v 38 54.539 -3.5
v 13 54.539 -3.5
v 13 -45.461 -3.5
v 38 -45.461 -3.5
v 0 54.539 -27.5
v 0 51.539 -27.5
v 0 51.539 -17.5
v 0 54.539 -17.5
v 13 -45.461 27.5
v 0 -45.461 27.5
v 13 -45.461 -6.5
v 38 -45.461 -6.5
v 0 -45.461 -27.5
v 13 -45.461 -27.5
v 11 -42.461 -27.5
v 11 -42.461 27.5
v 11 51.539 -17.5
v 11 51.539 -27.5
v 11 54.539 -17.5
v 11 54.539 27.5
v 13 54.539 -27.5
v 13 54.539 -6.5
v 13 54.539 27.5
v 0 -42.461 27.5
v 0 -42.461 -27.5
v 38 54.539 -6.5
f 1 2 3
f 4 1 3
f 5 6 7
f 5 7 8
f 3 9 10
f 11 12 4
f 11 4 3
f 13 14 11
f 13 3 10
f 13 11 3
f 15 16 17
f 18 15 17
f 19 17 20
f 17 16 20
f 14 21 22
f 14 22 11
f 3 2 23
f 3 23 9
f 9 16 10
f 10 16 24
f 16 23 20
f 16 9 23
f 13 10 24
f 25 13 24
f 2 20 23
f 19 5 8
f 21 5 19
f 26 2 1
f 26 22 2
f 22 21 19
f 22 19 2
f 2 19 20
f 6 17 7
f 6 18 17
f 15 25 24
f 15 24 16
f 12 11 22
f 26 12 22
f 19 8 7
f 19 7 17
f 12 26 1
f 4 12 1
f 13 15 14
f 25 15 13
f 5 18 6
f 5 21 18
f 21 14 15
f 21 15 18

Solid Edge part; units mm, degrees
sketch "Sketch1" plane through (0, 0, 0) normal (0, 0, 1) x (1, 0, 0)
  line L0 (0, 54.5388) -> (13, 54.5388)
  line L1 (13, 54.5388) -> (13, -45.4612)
  line L2 (13, -45.4612) -> (0, -45.4612)
  line L3 (0, -45.4612) -> (0, -42.4612)
  line L4 (0, -42.4612) -> (11, -42.4612)
  line L5 (11, -42.4612) -> (11, 51.5388)
  line L6 (11, 51.5388) -> (0, 51.5388)
  line L7 (0, 51.5388) -> (0, 54.5388)
  dimension "D1" = 13
  dimension "D2" = 100
  dimension "D3" = 3
  dimension "D4" = 2
  dimension "D5" = 3
extrude "Protrusion1" add sketch "Sketch1" along normal mid plane 55
sketch "Sketch2" plane through (13, 4.5388, 0) normal (1, 0, 0) x (0, 1, 0)
  line L0 (-50, -6.5) -> (50, -6.5)
  line L1 (50, -6.5) -> (50, -3.5)
  line L2 (50, -3.5) -> (-50, -3.5)
  line L3 (-50, -3.5) -> (-50, -6.5)
  dimension "D1" = 3
  dimension "D2" = 21
extrude "ExtrudedProtrusion_3" add sketch "Sketch2" along normal blind 25
sketch "Sketch3" plane through (10.5, 4.5388, 27.5) normal (0, 0, 1) x (1, 0, 0)
  line L0 (-10.5, 47) -> (0.5, 47)
  line L1 (0.5, 47) -> (0.5, 50)
  line L2 (0.5, 50) -> (-10.5, 50)
  line L3 (-10.5, 50) -> (-10.5, 47)
extrude "ExtrudedCutout_1" cut sketch "Sketch3" against normal blind 45
properties material "ABS Plastic, high impact"
